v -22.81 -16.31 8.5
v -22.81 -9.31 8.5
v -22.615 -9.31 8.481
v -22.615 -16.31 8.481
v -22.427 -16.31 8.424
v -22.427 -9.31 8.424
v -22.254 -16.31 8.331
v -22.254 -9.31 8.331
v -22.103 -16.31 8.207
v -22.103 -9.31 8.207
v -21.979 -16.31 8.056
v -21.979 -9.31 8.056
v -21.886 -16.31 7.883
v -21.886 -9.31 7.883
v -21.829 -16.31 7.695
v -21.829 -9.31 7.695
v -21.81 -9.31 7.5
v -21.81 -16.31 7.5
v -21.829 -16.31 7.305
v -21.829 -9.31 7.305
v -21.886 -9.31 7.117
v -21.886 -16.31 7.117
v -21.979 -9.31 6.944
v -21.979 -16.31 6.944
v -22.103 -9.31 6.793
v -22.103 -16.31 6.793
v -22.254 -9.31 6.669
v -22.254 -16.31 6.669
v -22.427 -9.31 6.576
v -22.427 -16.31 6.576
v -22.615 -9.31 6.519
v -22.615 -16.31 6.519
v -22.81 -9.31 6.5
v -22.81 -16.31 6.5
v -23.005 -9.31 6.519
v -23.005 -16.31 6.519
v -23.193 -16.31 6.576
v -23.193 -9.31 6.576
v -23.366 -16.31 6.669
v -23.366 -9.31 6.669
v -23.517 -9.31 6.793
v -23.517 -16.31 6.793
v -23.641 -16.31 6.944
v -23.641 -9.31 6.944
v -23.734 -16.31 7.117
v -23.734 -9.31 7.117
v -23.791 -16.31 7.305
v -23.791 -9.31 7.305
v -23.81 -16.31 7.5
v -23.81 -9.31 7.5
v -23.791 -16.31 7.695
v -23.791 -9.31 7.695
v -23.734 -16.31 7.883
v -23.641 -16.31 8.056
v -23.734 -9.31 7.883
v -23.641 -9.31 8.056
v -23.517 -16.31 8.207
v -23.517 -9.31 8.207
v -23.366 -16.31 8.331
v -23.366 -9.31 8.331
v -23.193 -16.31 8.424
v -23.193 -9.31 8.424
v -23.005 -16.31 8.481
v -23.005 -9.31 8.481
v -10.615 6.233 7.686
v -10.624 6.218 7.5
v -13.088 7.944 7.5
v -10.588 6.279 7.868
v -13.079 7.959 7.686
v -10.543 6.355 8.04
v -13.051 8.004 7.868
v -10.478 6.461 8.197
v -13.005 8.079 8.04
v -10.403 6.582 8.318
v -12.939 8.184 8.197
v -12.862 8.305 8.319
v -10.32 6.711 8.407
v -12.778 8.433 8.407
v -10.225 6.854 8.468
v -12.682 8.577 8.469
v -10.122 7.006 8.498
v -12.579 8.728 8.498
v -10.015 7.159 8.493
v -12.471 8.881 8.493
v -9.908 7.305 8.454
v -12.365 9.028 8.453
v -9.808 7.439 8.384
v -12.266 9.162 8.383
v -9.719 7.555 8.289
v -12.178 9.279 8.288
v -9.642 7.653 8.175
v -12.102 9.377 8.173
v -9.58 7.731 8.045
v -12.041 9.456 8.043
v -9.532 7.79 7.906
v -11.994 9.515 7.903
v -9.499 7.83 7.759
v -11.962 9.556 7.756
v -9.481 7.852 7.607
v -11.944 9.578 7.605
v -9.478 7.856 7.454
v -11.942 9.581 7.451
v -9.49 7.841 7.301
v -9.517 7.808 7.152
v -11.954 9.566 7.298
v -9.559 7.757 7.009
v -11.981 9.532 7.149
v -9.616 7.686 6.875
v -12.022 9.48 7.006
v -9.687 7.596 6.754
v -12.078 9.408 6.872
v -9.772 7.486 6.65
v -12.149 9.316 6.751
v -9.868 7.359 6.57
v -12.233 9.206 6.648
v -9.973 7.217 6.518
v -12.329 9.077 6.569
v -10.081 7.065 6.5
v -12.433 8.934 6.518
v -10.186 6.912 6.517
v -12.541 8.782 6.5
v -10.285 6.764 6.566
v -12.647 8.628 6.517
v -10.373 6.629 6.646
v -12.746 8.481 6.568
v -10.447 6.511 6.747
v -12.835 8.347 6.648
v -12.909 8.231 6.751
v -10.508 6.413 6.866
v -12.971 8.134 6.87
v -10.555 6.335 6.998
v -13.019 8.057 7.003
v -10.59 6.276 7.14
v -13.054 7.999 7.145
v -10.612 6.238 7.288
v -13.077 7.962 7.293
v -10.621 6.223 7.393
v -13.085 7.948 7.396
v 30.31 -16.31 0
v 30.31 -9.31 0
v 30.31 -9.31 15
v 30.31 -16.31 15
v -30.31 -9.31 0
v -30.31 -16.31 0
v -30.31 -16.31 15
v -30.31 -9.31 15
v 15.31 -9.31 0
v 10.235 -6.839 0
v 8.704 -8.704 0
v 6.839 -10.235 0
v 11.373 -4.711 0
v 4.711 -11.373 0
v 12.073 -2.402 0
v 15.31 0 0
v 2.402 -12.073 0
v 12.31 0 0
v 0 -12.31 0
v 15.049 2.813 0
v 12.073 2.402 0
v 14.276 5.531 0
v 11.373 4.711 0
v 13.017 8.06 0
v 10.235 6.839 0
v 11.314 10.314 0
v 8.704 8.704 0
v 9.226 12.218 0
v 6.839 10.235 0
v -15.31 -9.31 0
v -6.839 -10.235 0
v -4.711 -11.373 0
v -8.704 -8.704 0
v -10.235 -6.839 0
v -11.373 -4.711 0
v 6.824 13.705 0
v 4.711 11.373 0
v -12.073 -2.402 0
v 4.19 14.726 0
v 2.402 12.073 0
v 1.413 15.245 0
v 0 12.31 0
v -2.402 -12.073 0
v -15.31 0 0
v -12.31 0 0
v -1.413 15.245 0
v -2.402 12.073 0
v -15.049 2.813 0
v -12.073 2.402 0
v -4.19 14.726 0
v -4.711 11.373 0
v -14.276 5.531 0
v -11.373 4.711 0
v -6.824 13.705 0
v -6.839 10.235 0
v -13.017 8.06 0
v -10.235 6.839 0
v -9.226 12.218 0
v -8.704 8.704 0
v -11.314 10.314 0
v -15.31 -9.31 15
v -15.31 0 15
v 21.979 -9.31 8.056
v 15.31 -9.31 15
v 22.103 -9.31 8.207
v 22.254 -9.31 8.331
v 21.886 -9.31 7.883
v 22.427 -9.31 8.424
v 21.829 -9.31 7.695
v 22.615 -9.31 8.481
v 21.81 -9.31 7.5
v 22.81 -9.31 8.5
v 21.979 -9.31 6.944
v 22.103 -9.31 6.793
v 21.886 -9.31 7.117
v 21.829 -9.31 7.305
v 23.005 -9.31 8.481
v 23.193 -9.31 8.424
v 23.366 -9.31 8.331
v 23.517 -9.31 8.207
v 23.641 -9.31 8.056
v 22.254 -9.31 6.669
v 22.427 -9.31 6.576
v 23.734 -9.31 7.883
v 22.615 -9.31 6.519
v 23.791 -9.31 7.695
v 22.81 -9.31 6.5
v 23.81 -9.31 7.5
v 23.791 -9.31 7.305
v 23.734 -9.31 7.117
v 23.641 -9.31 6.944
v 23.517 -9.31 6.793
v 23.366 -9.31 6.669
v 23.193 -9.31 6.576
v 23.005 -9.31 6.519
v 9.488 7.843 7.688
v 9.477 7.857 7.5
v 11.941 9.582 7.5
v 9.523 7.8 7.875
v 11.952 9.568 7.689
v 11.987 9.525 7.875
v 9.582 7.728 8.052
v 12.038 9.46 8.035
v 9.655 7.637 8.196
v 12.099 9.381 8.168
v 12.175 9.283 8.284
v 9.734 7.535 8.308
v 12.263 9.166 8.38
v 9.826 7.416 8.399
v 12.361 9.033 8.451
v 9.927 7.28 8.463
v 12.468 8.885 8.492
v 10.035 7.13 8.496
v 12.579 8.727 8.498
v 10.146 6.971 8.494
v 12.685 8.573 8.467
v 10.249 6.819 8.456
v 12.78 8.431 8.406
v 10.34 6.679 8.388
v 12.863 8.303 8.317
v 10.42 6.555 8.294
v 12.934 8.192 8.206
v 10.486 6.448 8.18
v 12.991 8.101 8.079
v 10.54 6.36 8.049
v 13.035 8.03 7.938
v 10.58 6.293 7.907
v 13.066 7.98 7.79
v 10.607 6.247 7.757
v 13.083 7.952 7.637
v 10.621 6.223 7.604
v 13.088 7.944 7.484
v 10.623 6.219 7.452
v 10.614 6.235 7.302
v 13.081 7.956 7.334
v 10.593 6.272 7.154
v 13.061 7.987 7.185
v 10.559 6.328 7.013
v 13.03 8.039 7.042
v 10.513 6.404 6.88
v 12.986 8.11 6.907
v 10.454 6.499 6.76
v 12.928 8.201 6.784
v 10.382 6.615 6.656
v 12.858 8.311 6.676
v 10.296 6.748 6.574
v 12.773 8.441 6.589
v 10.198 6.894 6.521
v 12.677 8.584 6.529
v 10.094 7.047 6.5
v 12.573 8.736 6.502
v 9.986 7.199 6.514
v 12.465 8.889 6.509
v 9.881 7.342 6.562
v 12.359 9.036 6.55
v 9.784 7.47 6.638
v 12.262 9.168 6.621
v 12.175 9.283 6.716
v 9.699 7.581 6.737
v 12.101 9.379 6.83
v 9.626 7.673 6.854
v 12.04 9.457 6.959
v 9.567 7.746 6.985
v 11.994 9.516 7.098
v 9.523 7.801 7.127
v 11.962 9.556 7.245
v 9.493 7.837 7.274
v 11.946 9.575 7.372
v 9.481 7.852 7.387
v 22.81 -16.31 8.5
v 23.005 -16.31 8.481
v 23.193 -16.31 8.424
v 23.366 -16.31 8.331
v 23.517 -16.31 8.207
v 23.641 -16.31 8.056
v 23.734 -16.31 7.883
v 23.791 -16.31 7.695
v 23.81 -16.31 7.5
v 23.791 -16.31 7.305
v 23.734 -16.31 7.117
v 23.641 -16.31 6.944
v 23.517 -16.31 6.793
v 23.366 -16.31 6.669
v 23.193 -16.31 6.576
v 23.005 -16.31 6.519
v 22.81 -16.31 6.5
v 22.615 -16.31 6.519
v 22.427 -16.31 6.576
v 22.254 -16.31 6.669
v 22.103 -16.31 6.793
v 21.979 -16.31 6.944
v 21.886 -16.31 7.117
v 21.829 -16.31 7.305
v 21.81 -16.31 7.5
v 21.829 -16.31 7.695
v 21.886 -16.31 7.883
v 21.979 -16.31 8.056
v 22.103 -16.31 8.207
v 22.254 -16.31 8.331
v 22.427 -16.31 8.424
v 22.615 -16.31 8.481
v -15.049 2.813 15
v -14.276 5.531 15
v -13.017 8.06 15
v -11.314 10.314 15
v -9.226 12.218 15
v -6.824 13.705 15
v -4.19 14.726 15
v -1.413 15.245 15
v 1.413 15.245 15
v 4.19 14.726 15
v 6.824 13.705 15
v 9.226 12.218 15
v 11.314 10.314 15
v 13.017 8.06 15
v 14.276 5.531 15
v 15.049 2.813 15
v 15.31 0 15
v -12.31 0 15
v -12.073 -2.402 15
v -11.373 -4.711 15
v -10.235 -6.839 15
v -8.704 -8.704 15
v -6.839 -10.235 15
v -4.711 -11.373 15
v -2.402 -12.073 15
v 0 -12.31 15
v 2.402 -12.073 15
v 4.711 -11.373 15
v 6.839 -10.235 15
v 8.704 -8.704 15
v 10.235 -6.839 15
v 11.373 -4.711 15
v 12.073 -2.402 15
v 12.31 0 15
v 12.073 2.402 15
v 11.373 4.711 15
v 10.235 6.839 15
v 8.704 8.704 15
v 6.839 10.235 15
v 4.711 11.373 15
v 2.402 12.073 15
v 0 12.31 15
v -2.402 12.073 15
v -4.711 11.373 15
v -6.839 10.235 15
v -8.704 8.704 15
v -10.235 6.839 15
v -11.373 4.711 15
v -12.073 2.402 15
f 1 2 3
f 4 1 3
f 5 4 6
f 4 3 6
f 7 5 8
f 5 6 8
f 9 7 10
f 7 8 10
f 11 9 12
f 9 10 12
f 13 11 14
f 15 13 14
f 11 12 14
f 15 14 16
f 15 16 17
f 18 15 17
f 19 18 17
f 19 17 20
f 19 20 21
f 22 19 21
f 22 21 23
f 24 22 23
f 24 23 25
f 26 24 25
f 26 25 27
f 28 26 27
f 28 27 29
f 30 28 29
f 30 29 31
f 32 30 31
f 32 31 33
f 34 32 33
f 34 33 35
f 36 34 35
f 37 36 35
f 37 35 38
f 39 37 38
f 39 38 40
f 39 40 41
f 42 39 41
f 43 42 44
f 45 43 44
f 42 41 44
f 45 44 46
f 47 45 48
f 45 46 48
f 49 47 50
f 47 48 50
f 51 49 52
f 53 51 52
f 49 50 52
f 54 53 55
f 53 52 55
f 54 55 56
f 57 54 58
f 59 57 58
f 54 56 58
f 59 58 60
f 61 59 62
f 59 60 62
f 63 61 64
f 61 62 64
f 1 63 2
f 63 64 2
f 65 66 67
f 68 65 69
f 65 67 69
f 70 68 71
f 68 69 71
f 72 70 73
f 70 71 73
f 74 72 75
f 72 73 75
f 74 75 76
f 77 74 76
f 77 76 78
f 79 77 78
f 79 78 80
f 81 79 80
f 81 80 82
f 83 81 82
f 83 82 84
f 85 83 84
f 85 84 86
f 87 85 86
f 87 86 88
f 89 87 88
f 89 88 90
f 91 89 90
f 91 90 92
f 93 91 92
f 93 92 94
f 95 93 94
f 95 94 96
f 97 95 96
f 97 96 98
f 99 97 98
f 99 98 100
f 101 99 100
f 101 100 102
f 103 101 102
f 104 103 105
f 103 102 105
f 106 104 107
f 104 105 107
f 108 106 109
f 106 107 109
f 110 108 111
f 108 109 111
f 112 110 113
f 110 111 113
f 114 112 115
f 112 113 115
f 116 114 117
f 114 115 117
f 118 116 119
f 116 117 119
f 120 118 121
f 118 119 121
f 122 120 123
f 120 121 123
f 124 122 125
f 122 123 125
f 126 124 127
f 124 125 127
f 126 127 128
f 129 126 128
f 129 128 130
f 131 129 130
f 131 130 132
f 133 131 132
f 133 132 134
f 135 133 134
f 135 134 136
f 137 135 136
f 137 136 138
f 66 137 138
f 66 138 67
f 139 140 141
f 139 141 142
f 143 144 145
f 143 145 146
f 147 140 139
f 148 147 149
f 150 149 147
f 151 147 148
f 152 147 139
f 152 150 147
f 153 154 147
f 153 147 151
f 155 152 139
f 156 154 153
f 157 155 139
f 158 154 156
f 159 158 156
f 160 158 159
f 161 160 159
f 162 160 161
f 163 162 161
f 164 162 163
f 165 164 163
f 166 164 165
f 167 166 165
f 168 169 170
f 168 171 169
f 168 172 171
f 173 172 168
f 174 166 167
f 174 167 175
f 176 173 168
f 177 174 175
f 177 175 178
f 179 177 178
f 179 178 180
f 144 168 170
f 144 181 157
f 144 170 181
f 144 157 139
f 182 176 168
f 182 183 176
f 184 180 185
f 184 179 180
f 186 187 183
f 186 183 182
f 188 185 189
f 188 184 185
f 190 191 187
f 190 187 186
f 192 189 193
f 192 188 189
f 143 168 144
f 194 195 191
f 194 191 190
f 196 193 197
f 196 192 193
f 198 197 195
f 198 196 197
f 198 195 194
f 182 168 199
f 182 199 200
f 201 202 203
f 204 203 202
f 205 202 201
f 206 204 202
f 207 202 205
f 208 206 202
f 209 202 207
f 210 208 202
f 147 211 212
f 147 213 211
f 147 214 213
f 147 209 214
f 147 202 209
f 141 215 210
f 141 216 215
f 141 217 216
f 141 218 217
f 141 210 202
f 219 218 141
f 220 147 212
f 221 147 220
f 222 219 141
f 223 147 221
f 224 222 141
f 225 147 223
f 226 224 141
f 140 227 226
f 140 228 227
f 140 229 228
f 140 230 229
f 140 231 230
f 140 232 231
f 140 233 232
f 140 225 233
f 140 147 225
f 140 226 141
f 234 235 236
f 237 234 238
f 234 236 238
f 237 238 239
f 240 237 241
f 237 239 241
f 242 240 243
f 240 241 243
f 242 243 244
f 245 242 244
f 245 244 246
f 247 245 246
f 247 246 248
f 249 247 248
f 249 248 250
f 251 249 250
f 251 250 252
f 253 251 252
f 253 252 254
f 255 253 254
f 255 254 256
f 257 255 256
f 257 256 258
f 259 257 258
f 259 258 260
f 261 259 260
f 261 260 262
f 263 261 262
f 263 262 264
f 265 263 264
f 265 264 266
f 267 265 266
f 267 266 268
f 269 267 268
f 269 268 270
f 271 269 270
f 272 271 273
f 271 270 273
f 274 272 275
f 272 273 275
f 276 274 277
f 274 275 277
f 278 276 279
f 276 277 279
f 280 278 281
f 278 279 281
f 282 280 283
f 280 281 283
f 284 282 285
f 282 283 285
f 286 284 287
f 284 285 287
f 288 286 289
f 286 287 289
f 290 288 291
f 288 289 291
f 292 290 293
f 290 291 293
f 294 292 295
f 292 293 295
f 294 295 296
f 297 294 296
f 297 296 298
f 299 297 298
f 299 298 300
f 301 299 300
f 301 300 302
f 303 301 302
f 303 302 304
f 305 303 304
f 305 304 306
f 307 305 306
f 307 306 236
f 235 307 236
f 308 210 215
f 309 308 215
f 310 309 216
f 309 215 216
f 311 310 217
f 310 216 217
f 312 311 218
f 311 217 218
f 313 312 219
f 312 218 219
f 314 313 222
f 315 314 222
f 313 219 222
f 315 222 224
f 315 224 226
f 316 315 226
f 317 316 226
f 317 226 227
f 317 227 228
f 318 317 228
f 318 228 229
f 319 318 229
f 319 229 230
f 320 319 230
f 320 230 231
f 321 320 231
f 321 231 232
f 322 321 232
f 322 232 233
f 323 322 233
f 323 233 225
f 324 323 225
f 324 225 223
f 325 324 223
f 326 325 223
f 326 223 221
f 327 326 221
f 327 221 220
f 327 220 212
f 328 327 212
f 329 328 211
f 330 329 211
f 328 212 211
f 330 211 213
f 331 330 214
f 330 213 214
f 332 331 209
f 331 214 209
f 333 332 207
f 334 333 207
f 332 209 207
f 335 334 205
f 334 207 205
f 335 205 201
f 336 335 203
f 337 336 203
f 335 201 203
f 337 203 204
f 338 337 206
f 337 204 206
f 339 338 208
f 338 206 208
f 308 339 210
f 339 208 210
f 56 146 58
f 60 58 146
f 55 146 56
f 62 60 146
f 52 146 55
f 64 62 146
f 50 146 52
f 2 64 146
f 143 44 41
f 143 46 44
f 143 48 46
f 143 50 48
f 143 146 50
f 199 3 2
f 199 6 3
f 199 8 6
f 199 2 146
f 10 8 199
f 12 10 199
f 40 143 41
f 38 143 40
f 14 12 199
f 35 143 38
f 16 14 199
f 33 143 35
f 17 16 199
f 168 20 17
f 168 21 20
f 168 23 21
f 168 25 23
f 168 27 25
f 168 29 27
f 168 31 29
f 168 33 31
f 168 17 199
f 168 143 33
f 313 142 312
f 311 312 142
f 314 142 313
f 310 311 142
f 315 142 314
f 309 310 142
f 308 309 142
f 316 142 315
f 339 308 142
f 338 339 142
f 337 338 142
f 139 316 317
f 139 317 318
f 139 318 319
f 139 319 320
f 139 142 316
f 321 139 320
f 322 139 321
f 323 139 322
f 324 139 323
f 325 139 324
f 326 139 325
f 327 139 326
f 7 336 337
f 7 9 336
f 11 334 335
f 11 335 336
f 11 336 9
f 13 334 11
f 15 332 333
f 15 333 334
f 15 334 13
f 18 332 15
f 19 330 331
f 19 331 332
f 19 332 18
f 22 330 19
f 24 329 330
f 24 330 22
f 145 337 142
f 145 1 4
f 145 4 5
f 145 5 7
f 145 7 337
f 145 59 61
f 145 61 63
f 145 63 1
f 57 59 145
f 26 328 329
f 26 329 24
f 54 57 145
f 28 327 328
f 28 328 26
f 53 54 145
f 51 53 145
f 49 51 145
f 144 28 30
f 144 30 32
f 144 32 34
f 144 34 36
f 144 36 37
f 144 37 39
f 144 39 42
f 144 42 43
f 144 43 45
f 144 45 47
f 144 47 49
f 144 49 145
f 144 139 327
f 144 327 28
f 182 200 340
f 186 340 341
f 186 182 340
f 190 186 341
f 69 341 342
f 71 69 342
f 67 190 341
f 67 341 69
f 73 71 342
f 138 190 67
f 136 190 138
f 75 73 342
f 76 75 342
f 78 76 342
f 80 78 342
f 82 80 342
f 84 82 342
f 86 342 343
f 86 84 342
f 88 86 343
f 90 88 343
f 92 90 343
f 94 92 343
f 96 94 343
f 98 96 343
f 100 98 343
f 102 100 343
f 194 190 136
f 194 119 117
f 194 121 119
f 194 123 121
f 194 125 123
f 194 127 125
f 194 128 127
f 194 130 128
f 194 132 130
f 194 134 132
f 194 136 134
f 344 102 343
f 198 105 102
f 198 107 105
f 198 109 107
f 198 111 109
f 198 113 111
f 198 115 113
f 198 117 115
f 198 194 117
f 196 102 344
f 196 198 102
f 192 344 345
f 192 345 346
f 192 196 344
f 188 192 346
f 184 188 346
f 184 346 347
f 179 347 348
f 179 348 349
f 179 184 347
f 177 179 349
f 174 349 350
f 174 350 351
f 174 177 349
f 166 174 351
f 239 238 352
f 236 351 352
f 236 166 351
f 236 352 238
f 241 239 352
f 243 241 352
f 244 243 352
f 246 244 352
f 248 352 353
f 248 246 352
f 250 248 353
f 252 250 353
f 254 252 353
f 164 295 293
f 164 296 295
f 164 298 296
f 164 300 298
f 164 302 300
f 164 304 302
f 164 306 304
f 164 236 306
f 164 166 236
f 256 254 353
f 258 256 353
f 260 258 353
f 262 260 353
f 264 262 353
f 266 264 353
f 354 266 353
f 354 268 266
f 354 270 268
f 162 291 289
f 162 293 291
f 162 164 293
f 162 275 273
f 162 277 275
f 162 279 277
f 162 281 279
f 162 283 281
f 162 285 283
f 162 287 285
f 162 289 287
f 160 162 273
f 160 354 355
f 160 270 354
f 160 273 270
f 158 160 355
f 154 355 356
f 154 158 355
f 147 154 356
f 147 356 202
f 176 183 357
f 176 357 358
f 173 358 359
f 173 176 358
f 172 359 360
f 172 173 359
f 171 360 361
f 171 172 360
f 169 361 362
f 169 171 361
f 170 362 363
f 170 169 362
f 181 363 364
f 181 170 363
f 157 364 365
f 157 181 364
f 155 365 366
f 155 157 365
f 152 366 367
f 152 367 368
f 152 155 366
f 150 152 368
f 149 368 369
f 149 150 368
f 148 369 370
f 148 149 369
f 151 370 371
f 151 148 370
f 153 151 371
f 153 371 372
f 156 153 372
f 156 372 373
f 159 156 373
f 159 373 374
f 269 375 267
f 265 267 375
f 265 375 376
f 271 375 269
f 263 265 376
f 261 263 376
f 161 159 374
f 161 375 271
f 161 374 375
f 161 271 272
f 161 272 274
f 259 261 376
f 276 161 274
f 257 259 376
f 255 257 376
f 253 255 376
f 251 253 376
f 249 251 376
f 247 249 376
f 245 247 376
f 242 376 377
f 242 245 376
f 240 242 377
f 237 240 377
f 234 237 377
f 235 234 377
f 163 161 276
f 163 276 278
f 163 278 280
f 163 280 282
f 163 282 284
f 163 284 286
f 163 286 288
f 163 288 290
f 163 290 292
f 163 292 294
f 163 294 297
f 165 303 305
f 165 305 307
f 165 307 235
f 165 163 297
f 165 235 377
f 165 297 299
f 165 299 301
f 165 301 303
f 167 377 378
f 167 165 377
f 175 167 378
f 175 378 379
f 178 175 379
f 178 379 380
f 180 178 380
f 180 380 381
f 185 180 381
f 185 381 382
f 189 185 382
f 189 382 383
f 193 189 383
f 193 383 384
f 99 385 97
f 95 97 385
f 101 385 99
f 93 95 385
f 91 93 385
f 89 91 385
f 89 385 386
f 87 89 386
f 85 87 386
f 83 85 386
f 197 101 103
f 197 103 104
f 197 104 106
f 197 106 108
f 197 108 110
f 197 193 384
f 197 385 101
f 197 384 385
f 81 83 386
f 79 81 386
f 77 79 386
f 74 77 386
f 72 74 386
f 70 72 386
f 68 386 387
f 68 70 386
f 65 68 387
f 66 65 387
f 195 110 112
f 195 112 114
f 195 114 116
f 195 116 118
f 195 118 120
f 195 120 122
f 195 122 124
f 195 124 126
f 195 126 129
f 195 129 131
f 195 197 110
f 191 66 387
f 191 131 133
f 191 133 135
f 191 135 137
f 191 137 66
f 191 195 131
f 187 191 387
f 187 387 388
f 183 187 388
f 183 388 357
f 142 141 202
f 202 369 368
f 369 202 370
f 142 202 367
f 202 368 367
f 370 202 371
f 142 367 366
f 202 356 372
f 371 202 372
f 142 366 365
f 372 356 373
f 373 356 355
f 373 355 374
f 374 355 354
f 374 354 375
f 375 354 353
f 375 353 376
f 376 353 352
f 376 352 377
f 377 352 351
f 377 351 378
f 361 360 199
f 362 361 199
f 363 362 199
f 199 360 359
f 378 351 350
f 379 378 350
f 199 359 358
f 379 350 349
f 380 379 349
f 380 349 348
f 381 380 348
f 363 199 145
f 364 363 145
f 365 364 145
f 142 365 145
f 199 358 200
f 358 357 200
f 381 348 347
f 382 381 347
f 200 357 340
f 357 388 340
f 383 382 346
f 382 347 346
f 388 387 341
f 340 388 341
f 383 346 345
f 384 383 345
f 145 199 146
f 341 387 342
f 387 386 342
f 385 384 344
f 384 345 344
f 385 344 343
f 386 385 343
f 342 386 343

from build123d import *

# Parameters (mm, degrees)
BOSS_EXTRUDE1_DEPTH = 15
BOSS_EXTRUDE2_START = -15
BOSS_EXTRUDE2_DEPTH = 15
SKETCH2_R           = 1
CUT_EXTRUDE1_DEPTH  = 25
SKETCH5_R           = 1
CUT_EXTRUDE2_DEPTH  = 4
SKETCH6_R           = 1
CUT_EXTRUDE3_DEPTH  = 4


with BuildPart() as part:
    # Sketch1 → Boss-Extrude1 (new body)
    with BuildSketch(Plane.XY):
        with BuildLine():
            Line((-12.31, 0), (-12.31, -12.31))
            Line((-12.31, -12.31), (-30.31, -12.31))
            Line((-30.31, -12.31), (-30.31, -9.31))
            Line((-30.31, -9.31), (-15.31, -9.31))
            Line((-15.31, -9.31), (-15.31, 0))
            ThreePointArc((-15.31, 0), (0, 15.31), (15.31, 0))
            Line((15.31, 0), (15.31, -9.31))
            Line((15.31, -9.31), (30.31, -9.31))
            Line((30.31, -9.31), (30.31, -12.31))
            Line((30.31, -12.31), (12.31, -12.31))
            Line((12.31, -12.31), (12.31, 0))
            ThreePointArc((12.31, 0), (0, 12.31), (-12.31, 0))
        make_face()
    extrude(amount=BOSS_EXTRUDE1_DEPTH)

    # Sketch3 → Boss-Extrude2 (add)
    with BuildSketch(Plane.XY.offset(15).offset(BOSS_EXTRUDE2_START)):
        with BuildLine():
            Line((-30.31, -12.31), (-12.31, -12.31))
            Line((-12.31, -12.31), (-12.31, 0))
            ThreePointArc((-12.31, 0), (0, -12.31), (12.31, 0))
            Line((12.31, 0), (12.31, -12.31))
            Line((12.31, -12.31), (30.31, -12.31))
            Line((30.31, -12.31), (30.31, -16.31))
            Line((30.31, -16.31), (-30.31, -16.31))
            Line((-30.31, -16.31), (-30.31, -12.31))
        make_face()
    extrude(amount=BOSS_EXTRUDE2_DEPTH)

    # Sketch2 → Cut-Extrude1 (cut)
    with BuildSketch(Plane(origin=(0, -9.31, 0), x_dir=(1, 0, 0), z_dir=(0, 1, 0))):
        with Locations(Location((22.81, -7.5, 0), (0, 0, 270))):
            Circle(SKETCH2_R)
        with Locations(Location((-22.81, -7.5, 0), (0, 0, 270))):
            Circle(SKETCH2_R)
    extrude(amount=-CUT_EXTRUDE1_DEPTH, mode=Mode.SUBTRACT)

    # Sketch5 → Cut-Extrude2 (cut)
    with BuildSketch(Plane(origin=(12.541217798, 8.781455241, 0), x_dir=(0, 0, -1), z_dir=(0.819152044288993, 0.5735764363510446, 0))):
        with Locations(Location((-7.5, 0, 0), (0, 0, 90))):
            Circle(SKETCH5_R)
    extrude(amount=-CUT_EXTRUDE2_DEPTH, mode=Mode.SUBTRACT)

    # Sketch6 → Cut-Extrude3 (cut)
    with BuildSketch(Plane(origin=(-12.541217798, 8.781455241, 0), x_dir=(0, 0, 1), z_dir=(-0.8191520442889931, 0.5735764363510442, 0))):
        with Locations(Location((7.5, 0, 0), (0, 0, 270))):
            Circle(SKETCH6_R)
    extrude(amount=-CUT_EXTRUDE3_DEPTH, mode=Mode.SUBTRACT)


solid = part.part
